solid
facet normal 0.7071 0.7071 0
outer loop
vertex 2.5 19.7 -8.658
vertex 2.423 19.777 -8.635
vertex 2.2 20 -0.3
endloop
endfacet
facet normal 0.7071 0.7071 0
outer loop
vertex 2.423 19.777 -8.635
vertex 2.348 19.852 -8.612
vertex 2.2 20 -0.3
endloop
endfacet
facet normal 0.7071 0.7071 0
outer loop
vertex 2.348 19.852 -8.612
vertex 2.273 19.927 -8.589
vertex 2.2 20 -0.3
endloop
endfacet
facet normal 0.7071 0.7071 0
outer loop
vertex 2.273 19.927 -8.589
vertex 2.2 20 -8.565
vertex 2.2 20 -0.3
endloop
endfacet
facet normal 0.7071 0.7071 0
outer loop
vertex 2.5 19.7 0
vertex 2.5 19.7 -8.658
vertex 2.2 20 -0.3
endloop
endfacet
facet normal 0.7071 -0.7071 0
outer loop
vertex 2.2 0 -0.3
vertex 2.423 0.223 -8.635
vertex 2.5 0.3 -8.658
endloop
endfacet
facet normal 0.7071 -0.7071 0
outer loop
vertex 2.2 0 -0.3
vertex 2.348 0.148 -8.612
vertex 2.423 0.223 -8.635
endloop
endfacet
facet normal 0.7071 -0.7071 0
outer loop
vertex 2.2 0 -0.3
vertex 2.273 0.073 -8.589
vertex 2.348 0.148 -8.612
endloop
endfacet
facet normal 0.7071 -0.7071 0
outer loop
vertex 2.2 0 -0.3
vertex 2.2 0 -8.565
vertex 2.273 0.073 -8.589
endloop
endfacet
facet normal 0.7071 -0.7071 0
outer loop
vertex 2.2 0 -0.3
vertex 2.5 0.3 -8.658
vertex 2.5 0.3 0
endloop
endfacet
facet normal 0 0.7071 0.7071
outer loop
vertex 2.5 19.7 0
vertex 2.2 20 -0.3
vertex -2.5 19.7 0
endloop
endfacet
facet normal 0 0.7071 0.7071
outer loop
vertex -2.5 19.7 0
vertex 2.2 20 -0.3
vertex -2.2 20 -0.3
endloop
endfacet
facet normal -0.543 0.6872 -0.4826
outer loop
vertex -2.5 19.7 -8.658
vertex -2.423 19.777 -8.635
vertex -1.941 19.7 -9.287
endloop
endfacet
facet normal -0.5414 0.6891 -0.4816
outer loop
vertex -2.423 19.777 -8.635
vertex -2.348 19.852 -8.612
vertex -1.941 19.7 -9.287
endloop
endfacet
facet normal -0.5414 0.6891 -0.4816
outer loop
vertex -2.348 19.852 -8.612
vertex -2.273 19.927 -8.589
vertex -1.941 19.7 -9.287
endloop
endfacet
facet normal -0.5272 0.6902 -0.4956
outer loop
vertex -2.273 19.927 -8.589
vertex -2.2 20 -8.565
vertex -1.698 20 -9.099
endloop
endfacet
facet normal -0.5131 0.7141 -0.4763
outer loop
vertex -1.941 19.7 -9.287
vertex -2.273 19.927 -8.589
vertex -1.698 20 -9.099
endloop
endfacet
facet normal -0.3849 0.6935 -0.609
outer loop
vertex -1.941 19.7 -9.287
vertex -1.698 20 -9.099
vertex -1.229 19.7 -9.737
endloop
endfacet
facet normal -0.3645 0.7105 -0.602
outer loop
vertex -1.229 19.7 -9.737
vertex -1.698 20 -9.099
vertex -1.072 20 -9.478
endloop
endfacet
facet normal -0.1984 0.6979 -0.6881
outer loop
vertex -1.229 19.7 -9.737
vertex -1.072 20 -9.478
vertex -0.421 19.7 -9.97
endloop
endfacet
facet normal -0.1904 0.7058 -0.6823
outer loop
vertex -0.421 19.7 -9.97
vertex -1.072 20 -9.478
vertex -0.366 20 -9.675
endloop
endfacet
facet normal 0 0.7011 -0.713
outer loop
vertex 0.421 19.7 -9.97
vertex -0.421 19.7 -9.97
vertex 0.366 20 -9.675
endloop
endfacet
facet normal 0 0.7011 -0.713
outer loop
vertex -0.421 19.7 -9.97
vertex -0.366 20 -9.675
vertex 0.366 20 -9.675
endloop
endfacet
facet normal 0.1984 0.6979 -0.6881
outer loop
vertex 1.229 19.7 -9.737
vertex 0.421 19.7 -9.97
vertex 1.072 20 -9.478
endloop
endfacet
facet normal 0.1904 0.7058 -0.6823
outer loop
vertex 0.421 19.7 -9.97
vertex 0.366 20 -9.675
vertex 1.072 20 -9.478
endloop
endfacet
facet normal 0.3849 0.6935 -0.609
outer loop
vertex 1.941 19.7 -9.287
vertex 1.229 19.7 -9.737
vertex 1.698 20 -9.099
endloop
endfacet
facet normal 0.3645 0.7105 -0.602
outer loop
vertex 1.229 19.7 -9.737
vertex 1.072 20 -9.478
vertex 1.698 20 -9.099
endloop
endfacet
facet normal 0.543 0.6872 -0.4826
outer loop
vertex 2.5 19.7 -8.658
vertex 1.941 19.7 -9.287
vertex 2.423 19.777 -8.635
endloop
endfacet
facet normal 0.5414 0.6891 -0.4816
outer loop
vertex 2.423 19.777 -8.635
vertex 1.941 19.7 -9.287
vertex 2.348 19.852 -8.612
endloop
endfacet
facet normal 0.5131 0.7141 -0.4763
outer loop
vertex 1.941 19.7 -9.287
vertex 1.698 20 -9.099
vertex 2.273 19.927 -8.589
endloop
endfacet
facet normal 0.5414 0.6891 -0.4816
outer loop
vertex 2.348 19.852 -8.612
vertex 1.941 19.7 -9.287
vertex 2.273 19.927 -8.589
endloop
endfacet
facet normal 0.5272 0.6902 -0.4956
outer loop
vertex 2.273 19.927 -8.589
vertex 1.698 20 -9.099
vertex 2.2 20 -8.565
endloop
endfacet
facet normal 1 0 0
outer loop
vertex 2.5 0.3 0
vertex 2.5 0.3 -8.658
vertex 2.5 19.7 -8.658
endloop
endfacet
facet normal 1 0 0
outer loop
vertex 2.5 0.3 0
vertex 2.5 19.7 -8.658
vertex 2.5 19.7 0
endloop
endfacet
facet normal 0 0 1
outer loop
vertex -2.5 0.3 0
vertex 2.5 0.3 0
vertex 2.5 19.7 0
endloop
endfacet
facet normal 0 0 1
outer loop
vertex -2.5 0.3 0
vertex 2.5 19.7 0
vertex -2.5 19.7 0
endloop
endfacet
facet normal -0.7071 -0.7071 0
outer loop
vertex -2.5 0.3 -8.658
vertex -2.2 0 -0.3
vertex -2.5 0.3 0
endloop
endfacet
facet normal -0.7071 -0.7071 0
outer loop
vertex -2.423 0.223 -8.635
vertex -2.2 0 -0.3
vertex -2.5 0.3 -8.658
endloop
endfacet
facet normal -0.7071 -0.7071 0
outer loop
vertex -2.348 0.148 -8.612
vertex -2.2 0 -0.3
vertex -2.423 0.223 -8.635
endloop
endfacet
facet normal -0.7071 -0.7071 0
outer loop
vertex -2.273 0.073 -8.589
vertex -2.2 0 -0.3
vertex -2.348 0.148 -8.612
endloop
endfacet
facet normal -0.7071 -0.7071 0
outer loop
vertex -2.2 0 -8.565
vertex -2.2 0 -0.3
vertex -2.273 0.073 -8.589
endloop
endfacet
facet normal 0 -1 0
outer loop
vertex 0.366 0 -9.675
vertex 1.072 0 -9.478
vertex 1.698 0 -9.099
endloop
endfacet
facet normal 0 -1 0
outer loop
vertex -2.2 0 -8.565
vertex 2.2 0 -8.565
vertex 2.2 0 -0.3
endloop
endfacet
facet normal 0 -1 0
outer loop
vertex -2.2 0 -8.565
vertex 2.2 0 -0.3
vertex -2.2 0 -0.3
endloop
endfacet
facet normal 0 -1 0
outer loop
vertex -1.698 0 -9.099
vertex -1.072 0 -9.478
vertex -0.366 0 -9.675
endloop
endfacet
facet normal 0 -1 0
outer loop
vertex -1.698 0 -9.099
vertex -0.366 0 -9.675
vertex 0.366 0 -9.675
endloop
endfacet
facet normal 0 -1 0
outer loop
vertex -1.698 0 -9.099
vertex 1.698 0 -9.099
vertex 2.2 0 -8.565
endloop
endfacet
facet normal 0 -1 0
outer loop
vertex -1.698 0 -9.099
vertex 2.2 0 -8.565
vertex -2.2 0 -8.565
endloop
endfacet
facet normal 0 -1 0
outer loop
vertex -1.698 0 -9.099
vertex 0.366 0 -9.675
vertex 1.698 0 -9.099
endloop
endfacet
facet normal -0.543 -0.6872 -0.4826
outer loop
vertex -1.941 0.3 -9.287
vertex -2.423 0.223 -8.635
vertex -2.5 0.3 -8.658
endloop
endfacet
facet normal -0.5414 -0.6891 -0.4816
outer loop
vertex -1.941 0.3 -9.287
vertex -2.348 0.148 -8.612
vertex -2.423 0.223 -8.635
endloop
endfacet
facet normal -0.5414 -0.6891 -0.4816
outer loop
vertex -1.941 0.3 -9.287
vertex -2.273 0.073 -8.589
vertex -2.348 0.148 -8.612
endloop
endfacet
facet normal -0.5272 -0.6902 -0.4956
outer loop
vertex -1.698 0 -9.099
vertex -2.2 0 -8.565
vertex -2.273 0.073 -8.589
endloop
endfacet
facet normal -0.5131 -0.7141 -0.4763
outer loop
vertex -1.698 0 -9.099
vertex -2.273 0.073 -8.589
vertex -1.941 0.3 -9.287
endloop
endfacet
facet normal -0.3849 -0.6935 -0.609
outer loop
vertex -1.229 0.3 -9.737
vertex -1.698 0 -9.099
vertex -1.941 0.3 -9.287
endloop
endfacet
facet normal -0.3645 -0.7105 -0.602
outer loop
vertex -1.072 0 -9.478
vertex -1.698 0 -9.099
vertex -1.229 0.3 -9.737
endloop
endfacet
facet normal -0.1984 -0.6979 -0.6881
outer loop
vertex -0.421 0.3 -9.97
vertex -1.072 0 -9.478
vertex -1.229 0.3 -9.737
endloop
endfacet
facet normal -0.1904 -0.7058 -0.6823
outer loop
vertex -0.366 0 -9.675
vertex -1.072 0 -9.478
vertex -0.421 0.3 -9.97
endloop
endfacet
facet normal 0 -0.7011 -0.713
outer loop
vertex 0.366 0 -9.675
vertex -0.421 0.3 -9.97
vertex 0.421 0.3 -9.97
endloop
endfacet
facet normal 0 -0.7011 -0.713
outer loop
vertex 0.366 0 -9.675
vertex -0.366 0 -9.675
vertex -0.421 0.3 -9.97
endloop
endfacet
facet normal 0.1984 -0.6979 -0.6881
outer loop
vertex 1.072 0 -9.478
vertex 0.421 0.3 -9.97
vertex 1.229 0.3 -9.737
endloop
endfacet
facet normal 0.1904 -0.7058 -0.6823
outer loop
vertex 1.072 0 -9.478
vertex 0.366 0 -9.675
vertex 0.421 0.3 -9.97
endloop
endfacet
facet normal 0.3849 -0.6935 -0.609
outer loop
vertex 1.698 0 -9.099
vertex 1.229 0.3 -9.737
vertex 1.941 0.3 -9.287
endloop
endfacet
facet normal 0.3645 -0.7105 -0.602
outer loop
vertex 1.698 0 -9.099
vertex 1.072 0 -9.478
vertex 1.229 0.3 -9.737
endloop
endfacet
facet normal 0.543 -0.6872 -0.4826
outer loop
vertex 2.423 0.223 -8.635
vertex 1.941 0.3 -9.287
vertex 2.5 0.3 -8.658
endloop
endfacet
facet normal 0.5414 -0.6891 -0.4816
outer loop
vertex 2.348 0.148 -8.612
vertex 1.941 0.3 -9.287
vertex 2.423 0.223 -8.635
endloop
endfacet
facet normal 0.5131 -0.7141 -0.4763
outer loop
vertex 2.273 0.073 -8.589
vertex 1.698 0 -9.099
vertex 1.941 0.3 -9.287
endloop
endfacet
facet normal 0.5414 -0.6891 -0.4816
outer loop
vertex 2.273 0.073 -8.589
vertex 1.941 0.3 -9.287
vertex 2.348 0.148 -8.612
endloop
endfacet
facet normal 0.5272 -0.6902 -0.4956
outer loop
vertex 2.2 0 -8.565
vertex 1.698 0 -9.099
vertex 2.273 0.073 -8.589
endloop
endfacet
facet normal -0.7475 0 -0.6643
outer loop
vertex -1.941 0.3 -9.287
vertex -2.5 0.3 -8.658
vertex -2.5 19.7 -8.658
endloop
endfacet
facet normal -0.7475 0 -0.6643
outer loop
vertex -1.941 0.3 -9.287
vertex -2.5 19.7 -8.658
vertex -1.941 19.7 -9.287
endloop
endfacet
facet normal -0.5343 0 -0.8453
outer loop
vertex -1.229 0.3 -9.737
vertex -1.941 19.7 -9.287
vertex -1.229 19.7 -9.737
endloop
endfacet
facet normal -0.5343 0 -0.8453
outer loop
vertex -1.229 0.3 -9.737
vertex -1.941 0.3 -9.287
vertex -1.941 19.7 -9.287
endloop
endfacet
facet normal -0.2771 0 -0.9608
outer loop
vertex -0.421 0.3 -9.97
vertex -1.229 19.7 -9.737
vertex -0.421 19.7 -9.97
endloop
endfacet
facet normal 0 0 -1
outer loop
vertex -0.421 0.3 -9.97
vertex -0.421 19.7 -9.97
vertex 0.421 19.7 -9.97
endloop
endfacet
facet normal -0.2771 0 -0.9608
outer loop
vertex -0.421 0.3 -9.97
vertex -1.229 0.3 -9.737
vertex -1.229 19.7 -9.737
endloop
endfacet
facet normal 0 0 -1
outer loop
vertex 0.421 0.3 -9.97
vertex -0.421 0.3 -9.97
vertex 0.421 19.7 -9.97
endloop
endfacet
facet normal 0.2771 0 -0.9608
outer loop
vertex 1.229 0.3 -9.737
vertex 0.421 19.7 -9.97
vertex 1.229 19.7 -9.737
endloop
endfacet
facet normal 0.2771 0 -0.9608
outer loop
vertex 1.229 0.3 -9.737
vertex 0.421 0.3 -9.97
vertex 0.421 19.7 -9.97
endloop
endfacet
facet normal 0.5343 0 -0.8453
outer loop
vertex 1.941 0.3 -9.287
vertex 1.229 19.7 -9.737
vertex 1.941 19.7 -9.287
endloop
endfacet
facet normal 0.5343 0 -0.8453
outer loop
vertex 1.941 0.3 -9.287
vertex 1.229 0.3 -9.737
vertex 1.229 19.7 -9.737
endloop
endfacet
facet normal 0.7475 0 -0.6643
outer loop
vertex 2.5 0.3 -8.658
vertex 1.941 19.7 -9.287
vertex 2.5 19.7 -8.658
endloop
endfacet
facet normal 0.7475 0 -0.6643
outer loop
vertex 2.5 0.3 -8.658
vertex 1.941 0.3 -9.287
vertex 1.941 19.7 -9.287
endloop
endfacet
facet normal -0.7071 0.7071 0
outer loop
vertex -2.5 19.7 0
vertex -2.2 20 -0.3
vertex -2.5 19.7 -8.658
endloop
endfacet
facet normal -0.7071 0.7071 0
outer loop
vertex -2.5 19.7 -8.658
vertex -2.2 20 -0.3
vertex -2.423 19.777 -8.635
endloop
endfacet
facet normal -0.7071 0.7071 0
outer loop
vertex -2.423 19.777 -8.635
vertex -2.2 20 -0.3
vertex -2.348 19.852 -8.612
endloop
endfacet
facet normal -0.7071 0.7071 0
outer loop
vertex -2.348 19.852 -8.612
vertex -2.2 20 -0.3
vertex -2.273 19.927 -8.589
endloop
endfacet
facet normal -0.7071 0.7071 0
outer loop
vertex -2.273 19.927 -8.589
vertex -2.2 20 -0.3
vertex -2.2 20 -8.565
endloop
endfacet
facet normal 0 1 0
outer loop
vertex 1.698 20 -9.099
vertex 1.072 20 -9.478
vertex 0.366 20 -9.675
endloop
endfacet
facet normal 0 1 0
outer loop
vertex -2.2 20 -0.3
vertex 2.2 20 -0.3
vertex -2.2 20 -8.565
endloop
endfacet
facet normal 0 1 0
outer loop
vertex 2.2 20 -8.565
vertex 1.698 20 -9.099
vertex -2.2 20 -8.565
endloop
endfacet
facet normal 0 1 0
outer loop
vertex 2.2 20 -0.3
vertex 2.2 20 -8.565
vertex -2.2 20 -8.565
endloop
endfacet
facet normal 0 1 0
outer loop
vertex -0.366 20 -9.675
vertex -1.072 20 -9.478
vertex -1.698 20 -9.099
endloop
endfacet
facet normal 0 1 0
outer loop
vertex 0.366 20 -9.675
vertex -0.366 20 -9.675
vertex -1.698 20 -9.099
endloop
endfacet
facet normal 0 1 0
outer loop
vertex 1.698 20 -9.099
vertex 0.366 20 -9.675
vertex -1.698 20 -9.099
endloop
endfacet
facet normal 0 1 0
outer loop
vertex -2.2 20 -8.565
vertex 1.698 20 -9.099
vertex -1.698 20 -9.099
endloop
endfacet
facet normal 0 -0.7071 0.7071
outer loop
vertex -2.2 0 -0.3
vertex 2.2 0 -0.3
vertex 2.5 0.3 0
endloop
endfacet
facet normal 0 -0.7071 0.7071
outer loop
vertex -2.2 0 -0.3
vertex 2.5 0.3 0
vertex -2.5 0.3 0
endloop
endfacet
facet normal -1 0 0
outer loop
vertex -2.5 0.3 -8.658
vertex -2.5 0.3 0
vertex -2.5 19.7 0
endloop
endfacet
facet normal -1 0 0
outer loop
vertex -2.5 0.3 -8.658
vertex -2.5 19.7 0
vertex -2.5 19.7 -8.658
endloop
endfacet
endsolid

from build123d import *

# Parameters (mm, degrees)
BOSS_EXTRUDE1_DEPTH = 20
CHAMFER1_SIZE       = 0.3


with BuildPart() as part:
    # Sketch1 → Boss-Extrude1 (new body)
    with BuildSketch(Plane(origin=(0, 0, 0), x_dir=(1, 0, 0), z_dir=(0, 1, 0))):
        with BuildLine():
            Line((2.5, 0), (-2.5, 0))
            Line((-2.5, 0), (-2.5, 8.658312395))
            ThreePointArc((-2.5, 8.658312395), (0, 10), (2.5, 8.658312395))
            Line((2.5, 8.658312395), (2.5, 0))
        make_face()
    extrude(amount=BOSS_EXTRUDE1_DEPTH)

    # Chamfer1
    chamfer1_edges = [part.edges().sort_by_distance(p)[0] for p in [
        (0, 20, 0),
        (2.5, 20, -4.329156198),
        (0, 20, -10),
        (2.5, 0, -4.329156198),
        (0, 0, 0),
        (-2.5, 0, -4.329156198),
        (0, 0, -10),
        (-2.5, 20, -4.329156198),
    ]]
    chamfer(chamfer1_edges, length=CHAMFER1_SIZE)


solid = part.part
